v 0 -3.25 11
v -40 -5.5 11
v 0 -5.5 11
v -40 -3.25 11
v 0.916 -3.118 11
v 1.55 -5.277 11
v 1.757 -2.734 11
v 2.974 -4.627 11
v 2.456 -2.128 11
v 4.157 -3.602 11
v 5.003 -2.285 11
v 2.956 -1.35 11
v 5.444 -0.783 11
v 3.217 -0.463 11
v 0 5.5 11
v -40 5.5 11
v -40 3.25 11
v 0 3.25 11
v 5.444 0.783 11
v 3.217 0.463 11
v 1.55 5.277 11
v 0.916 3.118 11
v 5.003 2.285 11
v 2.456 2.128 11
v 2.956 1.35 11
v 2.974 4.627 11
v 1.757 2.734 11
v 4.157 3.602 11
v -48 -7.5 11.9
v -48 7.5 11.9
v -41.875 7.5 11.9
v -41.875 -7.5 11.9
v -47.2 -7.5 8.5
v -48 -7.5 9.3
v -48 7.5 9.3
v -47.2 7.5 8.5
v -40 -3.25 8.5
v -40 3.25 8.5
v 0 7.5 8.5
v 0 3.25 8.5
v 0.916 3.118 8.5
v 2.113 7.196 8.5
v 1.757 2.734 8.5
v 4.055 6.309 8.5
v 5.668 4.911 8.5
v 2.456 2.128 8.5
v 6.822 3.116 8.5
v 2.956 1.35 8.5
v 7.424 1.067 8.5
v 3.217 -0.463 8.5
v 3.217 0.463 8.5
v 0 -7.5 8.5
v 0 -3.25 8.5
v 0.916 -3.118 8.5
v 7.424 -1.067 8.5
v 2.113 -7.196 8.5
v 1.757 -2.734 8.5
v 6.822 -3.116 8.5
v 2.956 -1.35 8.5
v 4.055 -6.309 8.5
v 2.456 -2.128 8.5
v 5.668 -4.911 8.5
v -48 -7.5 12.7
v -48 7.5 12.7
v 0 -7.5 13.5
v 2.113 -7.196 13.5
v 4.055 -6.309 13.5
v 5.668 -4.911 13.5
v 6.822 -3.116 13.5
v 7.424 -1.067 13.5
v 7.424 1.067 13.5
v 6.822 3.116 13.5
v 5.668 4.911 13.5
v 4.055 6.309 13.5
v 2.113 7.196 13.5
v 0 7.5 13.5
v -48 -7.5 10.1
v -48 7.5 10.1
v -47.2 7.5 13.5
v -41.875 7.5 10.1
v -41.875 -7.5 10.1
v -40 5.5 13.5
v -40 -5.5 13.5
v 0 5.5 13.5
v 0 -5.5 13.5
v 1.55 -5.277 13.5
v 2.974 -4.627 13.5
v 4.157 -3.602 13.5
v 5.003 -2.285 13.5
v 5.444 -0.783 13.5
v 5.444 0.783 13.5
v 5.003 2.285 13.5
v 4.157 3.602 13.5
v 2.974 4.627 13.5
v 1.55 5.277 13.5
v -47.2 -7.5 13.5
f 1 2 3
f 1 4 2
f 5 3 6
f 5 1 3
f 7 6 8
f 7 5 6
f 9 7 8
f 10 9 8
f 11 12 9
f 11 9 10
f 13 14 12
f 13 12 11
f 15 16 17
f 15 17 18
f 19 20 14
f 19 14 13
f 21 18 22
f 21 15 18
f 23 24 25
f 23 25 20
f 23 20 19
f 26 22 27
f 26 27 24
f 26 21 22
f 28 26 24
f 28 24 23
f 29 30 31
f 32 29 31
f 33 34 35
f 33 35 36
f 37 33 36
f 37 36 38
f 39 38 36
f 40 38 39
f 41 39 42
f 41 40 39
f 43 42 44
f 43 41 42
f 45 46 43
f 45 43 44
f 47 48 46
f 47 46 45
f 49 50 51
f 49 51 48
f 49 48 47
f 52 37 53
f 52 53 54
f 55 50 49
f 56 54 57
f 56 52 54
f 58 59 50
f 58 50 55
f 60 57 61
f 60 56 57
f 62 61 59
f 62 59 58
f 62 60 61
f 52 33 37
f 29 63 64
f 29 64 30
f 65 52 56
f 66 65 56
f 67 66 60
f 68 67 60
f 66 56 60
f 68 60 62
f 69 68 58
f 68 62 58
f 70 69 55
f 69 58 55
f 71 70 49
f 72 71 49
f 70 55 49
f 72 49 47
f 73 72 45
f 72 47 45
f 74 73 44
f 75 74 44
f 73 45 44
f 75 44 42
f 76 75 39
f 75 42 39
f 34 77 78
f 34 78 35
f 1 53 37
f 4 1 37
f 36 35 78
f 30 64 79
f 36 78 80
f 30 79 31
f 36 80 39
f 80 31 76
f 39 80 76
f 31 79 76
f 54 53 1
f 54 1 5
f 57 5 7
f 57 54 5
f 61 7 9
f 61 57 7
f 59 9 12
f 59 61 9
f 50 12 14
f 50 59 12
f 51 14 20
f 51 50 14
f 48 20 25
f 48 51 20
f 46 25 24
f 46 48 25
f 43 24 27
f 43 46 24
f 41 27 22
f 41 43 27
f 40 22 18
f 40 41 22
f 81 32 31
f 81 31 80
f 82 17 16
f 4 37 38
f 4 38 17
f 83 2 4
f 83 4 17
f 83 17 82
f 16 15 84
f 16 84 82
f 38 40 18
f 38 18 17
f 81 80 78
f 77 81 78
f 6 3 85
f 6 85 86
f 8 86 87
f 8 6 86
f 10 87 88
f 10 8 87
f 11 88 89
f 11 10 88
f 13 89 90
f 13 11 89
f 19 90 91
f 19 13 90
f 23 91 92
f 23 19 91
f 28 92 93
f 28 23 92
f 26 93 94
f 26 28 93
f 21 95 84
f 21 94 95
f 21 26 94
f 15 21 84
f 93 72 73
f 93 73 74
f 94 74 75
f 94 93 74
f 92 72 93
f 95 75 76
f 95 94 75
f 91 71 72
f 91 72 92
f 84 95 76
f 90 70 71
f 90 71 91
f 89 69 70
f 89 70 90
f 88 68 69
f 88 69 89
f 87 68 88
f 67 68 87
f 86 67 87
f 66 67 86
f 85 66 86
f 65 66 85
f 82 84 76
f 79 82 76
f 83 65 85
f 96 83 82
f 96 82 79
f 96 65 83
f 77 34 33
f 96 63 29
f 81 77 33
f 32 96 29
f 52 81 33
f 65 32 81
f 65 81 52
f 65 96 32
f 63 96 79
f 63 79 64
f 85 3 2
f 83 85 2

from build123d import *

# Parameters (mm, degrees)
PAD001_DEPTH    = 5
POCKET003_DEPTH = 2.501
PAD002_DEPTH    = 15


with BuildPart() as part:
    # Sketch005 → Pad001 (new body)
    with BuildSketch(Plane.XY.offset(8.5)):
        with BuildLine():
            ThreePointArc((0, -7.5), (7.5, 0), (0, 7.5))
            Line((0, 7.5), (-40, 7.5))
            Line((-40, 7.5), (-40, 3.25))
            Line((0, 3.25), (-40, 3.25))
            ThreePointArc((0, -3.25), (3.25, 0), (0, 3.25))
            Line((0, -3.25), (-40, -3.25))
            Line((-40, -3.25), (-40, -7.5))
            Line((0, -7.5), (-40, -7.5))
        make_face()
    extrude(amount=PAD001_DEPTH)

    # Sketch006 → Pocket003 (cut, through all)
    with BuildSketch(Plane.XY.offset(11)):
        with BuildLine():
            ThreePointArc((0, -5.5), (5.5, 0), (0, 5.5))
            Line((0, 5.5), (-40, 5.5))
            ThreePointArc((-40, 5.5), (-45.5, 0), (-40, -5.5))
            Line((0, -5.5), (-40, -5.5))
        make_face()
    extrude(amount=POCKET003_DEPTH, mode=Mode.SUBTRACT)

    # Sketch007 → Pad002 (join)
    with BuildSketch(Plane.XZ.offset(7.5)):
        Polygon((-40, 13.5), (-47.2, 13.5), (-48, 12.7), (-48, 11.9), (-41.875, 11.9), (-41.875, 10.1), (-48, 10.1), (-48, 9.3), (-47.2, 8.5), (-40, 8.5), align=None)
    extrude(amount=-PAD002_DEPTH)


solid = part.part
